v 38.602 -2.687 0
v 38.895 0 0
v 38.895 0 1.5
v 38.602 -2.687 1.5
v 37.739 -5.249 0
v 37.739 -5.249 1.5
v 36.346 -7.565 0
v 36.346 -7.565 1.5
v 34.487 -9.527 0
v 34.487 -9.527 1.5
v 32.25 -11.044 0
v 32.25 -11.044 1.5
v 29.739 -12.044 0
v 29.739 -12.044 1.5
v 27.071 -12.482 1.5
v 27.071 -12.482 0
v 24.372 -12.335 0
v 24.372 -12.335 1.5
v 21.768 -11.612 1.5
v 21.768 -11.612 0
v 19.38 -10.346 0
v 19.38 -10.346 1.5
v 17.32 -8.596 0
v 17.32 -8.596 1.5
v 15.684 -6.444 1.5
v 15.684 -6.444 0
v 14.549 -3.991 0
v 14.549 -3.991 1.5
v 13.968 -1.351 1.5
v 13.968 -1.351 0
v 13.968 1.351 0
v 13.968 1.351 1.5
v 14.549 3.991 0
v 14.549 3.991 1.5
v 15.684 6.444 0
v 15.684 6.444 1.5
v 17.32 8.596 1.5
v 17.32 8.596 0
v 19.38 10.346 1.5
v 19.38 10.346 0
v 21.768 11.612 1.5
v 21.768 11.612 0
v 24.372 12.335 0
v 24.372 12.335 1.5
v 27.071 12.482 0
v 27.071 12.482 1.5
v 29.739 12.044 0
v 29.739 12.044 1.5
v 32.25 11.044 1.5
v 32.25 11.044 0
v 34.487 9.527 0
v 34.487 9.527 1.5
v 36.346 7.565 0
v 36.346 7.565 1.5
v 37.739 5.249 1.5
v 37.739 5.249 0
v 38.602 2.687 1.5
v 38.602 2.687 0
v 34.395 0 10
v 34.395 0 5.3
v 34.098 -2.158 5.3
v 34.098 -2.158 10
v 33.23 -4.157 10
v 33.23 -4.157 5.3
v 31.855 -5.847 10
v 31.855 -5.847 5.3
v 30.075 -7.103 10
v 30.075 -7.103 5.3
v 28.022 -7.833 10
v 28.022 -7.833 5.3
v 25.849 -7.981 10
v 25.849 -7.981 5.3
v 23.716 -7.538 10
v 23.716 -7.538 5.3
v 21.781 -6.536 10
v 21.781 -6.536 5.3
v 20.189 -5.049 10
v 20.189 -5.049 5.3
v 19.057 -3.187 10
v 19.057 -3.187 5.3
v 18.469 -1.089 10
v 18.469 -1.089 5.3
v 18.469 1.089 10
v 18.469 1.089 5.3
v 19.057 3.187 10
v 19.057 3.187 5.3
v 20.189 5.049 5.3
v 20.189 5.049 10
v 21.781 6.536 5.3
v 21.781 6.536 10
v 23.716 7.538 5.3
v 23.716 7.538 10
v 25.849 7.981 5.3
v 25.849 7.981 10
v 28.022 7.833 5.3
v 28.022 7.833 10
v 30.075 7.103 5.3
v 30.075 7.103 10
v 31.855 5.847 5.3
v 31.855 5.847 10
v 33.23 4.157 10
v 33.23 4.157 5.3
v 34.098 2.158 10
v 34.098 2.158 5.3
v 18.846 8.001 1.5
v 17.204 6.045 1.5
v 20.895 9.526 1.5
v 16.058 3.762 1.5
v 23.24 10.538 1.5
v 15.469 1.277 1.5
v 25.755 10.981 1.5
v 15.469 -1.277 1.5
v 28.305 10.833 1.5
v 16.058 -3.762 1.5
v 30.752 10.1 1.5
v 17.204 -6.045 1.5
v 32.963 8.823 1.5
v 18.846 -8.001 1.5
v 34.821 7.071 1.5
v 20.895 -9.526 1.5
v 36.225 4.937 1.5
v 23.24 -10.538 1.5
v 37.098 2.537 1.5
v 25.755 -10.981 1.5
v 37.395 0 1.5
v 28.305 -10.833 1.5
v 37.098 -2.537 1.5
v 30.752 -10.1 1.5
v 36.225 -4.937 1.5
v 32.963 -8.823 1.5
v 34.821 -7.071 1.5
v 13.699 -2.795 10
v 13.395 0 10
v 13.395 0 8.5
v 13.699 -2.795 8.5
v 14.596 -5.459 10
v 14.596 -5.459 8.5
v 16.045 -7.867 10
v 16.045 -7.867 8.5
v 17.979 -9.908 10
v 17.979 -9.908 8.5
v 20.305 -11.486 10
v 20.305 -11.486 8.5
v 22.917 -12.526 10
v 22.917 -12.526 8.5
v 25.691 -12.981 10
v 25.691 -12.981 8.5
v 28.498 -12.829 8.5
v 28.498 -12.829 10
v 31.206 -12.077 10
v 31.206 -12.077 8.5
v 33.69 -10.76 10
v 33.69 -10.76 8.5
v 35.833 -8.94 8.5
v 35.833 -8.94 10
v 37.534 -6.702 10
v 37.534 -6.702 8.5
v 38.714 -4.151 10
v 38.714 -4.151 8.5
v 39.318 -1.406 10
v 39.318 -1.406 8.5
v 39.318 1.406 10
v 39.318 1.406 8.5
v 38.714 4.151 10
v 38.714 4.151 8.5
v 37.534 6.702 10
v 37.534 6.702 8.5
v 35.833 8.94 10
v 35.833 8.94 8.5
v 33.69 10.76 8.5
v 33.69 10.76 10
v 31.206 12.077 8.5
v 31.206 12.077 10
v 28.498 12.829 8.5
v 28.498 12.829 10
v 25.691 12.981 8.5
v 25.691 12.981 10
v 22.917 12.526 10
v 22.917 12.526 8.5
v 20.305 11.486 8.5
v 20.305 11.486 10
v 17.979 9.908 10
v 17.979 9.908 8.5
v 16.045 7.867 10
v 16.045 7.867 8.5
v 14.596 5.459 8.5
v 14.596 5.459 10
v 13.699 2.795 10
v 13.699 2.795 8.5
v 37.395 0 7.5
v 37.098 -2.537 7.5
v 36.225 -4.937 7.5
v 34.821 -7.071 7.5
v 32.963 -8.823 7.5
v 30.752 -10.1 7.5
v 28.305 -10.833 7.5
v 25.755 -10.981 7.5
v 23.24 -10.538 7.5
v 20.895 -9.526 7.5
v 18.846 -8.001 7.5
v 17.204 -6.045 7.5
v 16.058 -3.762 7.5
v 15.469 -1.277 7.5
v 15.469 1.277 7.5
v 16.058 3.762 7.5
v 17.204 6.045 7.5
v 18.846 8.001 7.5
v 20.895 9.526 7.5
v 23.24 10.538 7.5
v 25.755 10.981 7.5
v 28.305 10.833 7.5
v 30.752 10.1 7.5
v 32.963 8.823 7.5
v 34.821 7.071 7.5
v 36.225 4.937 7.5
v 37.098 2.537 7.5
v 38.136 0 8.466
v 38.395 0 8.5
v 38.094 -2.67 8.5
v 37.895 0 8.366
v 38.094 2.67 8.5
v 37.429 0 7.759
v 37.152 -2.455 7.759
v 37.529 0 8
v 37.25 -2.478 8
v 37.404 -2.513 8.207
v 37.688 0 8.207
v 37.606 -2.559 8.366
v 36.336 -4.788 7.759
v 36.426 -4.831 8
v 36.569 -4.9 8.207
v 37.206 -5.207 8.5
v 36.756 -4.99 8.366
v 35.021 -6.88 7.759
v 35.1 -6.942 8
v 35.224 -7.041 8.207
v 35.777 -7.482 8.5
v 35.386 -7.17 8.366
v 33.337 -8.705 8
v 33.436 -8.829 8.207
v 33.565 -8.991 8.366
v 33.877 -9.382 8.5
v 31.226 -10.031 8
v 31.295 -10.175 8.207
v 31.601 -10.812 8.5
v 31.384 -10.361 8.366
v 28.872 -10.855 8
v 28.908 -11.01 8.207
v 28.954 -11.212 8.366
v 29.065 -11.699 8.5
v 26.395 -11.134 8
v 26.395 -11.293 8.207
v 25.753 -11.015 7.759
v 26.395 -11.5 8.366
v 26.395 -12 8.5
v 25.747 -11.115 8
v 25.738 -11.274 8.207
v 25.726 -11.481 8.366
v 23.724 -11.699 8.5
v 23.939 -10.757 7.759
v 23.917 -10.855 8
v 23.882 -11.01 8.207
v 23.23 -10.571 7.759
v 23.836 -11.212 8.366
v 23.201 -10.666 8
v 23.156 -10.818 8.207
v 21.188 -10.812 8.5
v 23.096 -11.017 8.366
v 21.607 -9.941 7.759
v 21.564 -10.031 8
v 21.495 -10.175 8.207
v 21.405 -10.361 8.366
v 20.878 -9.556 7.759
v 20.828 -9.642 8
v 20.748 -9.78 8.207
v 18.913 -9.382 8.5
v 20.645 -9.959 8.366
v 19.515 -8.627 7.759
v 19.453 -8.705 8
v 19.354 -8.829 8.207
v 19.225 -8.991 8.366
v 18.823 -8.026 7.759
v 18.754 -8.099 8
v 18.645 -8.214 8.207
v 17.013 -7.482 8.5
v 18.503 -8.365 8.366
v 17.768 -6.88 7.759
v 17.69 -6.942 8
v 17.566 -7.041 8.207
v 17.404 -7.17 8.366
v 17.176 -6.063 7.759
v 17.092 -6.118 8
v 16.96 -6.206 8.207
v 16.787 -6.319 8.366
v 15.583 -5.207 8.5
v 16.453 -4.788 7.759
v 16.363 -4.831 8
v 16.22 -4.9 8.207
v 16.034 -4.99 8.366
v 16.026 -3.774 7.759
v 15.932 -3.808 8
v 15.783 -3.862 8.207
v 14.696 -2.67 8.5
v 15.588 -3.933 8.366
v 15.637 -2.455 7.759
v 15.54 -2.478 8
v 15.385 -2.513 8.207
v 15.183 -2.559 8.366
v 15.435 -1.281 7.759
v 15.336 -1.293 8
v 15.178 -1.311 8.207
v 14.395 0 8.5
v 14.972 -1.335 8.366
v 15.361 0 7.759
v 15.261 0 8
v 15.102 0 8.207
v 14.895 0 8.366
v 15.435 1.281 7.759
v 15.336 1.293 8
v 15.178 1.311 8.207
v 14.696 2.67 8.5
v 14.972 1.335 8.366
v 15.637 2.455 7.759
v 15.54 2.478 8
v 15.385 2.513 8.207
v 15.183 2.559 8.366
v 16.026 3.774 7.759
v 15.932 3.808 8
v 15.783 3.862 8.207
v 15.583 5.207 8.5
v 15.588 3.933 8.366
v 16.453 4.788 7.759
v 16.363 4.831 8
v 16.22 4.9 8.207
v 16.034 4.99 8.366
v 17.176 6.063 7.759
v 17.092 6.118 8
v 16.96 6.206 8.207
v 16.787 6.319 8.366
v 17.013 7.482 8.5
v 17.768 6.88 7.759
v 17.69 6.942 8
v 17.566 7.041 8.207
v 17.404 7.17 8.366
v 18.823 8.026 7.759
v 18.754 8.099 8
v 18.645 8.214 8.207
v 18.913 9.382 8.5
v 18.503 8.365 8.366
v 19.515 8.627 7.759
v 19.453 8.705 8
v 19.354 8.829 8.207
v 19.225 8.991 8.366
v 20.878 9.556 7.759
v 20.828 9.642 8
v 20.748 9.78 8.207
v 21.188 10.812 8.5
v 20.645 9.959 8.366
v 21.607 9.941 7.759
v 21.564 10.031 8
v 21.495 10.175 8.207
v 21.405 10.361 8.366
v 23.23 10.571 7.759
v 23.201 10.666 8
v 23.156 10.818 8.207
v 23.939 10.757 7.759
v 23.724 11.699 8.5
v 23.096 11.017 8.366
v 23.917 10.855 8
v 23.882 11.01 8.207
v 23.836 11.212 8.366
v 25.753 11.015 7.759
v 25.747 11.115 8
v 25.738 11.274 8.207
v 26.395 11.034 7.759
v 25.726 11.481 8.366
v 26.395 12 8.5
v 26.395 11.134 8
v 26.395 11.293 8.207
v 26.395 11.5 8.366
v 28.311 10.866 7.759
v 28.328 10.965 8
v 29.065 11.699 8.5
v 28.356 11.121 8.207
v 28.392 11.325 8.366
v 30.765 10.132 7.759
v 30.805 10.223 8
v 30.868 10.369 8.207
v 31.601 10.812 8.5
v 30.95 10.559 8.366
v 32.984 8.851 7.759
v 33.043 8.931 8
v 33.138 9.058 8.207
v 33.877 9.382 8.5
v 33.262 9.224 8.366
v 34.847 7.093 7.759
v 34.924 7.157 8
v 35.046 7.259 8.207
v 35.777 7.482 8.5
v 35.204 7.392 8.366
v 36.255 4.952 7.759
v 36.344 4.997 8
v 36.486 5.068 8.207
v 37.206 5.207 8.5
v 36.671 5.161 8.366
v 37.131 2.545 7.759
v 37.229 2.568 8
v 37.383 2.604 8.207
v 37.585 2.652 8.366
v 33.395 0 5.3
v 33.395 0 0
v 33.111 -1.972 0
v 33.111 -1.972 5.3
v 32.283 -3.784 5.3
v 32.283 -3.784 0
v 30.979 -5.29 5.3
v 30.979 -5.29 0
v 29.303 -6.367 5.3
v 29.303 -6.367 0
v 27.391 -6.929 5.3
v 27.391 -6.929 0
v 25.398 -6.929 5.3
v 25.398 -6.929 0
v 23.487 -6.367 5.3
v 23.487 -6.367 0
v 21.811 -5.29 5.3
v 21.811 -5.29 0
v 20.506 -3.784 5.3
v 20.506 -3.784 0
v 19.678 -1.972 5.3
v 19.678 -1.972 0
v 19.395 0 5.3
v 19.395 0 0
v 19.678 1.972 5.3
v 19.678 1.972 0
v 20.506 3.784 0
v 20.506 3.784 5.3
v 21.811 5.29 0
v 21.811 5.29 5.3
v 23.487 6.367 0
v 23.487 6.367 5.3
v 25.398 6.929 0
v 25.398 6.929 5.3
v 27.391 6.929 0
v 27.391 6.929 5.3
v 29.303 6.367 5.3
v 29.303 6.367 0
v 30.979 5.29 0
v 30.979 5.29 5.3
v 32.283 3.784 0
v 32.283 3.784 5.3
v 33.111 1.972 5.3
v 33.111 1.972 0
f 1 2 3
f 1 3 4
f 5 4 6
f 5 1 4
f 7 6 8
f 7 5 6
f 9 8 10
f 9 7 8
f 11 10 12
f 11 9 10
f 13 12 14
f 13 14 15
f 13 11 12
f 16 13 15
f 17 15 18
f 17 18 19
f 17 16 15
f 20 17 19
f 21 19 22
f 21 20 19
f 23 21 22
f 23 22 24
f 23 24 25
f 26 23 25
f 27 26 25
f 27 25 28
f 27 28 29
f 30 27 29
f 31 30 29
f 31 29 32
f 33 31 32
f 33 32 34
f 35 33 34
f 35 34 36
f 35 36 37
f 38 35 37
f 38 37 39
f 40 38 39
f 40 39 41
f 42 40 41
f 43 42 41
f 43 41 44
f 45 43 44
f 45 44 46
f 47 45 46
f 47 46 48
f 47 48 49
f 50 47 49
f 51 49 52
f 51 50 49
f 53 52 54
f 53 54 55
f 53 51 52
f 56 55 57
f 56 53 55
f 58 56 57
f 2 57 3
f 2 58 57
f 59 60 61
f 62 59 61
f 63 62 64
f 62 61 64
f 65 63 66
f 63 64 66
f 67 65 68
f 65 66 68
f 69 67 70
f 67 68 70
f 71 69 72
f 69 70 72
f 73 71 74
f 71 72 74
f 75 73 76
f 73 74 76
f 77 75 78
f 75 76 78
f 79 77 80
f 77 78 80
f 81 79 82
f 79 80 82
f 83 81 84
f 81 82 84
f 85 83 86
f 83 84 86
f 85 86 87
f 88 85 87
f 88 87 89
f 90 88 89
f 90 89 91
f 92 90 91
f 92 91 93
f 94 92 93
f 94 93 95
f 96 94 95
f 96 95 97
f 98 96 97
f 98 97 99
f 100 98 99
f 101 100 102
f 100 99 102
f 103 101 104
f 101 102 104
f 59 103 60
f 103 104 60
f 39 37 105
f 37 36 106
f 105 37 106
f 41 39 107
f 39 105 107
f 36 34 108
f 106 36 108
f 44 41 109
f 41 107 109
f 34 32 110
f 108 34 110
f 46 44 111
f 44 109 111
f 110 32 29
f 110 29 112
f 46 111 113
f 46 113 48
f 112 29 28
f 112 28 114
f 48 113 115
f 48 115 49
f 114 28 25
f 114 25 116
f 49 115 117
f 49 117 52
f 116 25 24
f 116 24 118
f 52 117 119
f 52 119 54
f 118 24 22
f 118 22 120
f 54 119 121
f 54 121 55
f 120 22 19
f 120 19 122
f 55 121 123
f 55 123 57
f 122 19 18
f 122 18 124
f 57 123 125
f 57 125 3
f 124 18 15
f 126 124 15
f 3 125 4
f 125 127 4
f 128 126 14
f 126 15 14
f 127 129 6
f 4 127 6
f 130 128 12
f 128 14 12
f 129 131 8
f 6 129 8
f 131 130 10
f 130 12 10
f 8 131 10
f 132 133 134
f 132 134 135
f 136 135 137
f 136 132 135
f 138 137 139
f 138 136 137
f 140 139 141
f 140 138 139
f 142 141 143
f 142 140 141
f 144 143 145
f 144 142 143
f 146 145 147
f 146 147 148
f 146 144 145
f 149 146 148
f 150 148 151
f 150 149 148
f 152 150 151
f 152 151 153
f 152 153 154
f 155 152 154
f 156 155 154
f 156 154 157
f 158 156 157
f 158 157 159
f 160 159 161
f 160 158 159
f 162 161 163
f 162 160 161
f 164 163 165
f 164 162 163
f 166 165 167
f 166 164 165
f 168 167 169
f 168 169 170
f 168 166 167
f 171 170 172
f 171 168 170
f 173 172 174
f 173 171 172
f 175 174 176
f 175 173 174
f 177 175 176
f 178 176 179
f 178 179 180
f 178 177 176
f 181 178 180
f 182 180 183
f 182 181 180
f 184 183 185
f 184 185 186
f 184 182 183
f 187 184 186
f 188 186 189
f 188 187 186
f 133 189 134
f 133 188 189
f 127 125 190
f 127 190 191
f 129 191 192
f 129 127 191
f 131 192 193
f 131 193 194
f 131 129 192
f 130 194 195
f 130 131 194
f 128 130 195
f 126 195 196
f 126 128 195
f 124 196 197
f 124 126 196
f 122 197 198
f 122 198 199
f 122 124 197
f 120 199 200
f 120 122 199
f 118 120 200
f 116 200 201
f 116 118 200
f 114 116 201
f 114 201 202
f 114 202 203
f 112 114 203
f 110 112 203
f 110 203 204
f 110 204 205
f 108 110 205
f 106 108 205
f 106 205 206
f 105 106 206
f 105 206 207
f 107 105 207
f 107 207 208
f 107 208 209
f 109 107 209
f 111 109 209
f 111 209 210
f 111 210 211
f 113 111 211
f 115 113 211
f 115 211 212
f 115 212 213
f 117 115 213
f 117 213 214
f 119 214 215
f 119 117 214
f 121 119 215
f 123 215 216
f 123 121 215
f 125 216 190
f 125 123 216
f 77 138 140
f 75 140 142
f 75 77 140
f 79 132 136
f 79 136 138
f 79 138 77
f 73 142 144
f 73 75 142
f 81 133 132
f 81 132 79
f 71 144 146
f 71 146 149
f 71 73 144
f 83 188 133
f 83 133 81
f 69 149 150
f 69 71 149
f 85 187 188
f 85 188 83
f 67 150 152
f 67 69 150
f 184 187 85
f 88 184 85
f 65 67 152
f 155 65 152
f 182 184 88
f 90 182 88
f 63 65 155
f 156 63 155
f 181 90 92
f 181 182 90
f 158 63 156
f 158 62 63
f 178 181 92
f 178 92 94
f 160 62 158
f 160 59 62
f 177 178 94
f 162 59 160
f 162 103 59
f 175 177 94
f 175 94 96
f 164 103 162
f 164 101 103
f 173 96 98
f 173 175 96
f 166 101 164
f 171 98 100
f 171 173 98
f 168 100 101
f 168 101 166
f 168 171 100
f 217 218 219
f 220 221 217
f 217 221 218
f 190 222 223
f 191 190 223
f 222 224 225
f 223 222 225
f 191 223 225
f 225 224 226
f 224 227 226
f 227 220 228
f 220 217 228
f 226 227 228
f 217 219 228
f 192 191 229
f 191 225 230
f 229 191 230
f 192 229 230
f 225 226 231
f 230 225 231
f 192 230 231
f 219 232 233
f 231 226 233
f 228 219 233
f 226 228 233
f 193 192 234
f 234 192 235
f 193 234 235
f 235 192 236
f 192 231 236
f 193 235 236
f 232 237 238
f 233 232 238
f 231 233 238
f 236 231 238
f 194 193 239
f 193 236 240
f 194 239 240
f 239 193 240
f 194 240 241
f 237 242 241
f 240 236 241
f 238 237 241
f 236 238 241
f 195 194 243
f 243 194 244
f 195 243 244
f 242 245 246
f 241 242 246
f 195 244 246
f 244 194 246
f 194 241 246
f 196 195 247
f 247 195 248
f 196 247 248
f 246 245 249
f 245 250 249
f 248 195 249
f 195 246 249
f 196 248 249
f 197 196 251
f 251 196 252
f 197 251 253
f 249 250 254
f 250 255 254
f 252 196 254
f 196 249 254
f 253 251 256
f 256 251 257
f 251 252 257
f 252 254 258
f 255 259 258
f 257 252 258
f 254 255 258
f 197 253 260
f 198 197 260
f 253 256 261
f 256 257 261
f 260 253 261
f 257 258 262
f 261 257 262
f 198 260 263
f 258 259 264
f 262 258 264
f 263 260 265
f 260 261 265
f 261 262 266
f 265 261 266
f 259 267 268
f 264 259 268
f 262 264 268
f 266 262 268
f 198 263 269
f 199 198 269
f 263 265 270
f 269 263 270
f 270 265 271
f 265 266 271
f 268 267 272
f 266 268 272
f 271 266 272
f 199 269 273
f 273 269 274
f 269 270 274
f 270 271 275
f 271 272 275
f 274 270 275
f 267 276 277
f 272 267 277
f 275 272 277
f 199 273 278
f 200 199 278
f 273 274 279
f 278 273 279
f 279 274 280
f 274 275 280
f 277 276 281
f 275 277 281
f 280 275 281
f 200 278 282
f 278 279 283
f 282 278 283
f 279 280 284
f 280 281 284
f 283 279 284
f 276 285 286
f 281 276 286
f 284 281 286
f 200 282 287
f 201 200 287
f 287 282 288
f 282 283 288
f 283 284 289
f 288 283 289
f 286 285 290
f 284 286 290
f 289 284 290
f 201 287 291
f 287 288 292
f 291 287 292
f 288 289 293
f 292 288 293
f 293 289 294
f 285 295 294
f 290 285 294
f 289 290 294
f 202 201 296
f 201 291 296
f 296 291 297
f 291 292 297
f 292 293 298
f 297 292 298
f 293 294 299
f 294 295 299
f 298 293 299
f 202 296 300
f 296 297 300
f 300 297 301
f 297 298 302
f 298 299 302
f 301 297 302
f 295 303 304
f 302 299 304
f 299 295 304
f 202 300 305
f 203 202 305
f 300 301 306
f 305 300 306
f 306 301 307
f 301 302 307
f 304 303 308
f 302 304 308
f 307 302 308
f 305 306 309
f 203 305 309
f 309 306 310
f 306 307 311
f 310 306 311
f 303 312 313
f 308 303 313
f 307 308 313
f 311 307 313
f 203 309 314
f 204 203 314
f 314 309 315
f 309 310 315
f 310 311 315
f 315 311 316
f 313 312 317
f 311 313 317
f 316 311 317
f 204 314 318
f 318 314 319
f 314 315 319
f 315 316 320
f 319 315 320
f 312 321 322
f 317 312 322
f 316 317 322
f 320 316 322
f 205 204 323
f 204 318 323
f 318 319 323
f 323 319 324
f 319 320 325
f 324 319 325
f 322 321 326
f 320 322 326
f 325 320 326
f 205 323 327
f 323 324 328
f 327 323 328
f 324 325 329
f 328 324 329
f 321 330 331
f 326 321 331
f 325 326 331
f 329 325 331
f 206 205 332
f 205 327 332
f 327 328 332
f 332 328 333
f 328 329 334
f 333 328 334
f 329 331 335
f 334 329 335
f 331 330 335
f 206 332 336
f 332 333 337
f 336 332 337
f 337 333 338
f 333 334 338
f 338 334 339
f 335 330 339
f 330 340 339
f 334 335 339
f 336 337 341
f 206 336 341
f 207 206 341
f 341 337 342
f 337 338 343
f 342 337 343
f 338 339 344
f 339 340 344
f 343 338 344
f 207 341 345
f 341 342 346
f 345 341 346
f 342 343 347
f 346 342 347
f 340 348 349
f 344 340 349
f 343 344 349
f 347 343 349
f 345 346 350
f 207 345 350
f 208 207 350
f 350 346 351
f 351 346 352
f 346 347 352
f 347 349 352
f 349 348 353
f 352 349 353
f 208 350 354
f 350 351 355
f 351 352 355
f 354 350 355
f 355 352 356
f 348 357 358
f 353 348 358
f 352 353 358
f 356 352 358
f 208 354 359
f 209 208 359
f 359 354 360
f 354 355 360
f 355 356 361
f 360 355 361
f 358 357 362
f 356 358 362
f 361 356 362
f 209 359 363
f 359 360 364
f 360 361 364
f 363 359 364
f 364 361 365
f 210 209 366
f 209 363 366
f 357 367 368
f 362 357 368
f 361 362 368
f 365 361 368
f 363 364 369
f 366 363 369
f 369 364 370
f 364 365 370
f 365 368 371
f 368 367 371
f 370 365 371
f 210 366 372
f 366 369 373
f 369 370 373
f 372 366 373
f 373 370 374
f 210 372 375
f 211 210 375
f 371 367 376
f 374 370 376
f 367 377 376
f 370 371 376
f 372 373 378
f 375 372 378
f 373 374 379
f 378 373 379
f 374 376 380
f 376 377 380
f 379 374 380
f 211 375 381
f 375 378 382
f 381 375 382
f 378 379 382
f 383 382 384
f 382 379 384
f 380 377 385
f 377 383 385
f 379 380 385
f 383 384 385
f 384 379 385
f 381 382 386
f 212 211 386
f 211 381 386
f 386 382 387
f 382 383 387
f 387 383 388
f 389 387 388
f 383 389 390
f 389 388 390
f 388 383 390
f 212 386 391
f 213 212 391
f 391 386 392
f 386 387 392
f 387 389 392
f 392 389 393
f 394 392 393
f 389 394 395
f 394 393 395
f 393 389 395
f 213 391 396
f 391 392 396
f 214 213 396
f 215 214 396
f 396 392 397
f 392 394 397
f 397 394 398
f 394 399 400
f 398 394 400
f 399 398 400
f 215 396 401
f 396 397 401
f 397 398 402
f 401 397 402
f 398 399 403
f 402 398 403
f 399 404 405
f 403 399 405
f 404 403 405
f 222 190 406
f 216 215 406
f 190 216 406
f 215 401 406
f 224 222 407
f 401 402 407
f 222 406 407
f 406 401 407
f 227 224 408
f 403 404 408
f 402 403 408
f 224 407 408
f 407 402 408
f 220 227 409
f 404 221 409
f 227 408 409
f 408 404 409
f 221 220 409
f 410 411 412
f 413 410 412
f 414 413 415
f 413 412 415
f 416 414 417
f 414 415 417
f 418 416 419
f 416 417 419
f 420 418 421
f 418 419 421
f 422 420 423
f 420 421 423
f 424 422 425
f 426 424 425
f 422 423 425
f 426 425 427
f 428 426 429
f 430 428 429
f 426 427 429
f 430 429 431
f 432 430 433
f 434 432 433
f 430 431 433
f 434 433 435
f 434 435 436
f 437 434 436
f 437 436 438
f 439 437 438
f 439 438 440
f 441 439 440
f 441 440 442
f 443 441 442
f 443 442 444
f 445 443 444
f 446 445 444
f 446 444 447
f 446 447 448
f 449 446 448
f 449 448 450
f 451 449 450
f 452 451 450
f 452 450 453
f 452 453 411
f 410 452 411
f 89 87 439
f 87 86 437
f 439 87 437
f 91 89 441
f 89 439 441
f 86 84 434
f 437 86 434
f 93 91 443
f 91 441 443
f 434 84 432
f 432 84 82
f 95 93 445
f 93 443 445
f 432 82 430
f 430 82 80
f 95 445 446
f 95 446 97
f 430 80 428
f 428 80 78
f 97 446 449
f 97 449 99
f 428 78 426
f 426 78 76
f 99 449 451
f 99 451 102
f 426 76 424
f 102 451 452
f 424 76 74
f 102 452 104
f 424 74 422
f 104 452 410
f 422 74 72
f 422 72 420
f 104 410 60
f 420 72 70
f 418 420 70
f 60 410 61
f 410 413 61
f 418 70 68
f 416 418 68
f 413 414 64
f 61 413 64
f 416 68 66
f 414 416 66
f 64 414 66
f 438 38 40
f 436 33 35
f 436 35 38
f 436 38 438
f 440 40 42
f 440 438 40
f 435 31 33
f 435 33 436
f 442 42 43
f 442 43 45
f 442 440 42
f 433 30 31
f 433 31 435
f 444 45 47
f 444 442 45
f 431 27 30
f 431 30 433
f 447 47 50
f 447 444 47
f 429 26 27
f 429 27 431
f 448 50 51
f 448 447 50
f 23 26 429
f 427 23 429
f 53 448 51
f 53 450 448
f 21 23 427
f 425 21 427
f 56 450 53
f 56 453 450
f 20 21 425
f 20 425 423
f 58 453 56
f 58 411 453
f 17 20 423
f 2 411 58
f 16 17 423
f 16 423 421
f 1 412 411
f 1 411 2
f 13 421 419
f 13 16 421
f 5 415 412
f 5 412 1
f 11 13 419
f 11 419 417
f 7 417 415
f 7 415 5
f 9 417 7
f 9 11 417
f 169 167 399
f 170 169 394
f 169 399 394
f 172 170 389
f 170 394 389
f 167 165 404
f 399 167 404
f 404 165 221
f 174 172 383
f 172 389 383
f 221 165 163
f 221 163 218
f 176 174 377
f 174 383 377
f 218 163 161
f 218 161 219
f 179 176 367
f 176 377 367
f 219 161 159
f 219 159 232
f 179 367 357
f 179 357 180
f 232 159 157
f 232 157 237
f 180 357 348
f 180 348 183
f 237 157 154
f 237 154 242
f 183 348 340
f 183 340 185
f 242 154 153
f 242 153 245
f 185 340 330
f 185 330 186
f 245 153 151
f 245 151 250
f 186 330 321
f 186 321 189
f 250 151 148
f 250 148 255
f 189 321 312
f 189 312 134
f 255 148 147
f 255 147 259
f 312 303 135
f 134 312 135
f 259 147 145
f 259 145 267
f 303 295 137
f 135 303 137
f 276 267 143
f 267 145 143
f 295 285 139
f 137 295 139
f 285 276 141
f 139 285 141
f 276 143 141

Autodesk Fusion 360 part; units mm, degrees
sketch "Sketch3" plane through (0, 0, 0) normal (0, 0, 1) x (1, 0, 0)
  circle A0 centre (26.3947, 0) radius 8
  circle A1 centre (26.3947, 0) radius 11
  dimension "d13" = 16
  dimension "d14" = 22
extrude "Extrude4" add sketch "Sketch3" along normal blind 10
sketch "Sketch4" plane through (0, 0, 10) normal (0, 0, 1) x (-1, 0, 0)
  circle A0 centre (-26.3947, 0) radius 8
  circle A1 centre (-26.3947, 0) radius 11
  circle A2 centre (-26.3947, 0) radius 13
  circle A3 centre (-26.3947, 0) radius 8
  dimension "d17" = 26
extrude "Extrude5" add sketch "Sketch4" against normal blind 1.5 contours A2
sketch "Sketch5" plane through (0, 0, 0) normal (0, 0, -1) x (1, 0, 0)
  circle A0 centre (26.3947, 0) radius 8
  circle A1 centre (26.3947, 0) radius 11
  circle A2 centre (26.3947, 0) radius 12.5
  dimension "d20" = 25
extrude "Extrude6" add sketch "Sketch5" against normal blind 1.5 contours A2
fillet "Fillet2" radius 1 1 edges at (16.1391, 3.9778, 8.5)
sketch "Sketch6" plane through (0, 0, 0) normal (0, 0, -1) x (1, 0, 0)
  circle A0 centre (26.3947, 0) radius 12.5
  circle A1 centre (26.3947, 0) radius 8
  circle A2 centre (26.3947, 0) radius 7
  dimension "d25" = 14
extrude "Extrude7" add sketch "Sketch6" against normal blind 5.3 contours A1
